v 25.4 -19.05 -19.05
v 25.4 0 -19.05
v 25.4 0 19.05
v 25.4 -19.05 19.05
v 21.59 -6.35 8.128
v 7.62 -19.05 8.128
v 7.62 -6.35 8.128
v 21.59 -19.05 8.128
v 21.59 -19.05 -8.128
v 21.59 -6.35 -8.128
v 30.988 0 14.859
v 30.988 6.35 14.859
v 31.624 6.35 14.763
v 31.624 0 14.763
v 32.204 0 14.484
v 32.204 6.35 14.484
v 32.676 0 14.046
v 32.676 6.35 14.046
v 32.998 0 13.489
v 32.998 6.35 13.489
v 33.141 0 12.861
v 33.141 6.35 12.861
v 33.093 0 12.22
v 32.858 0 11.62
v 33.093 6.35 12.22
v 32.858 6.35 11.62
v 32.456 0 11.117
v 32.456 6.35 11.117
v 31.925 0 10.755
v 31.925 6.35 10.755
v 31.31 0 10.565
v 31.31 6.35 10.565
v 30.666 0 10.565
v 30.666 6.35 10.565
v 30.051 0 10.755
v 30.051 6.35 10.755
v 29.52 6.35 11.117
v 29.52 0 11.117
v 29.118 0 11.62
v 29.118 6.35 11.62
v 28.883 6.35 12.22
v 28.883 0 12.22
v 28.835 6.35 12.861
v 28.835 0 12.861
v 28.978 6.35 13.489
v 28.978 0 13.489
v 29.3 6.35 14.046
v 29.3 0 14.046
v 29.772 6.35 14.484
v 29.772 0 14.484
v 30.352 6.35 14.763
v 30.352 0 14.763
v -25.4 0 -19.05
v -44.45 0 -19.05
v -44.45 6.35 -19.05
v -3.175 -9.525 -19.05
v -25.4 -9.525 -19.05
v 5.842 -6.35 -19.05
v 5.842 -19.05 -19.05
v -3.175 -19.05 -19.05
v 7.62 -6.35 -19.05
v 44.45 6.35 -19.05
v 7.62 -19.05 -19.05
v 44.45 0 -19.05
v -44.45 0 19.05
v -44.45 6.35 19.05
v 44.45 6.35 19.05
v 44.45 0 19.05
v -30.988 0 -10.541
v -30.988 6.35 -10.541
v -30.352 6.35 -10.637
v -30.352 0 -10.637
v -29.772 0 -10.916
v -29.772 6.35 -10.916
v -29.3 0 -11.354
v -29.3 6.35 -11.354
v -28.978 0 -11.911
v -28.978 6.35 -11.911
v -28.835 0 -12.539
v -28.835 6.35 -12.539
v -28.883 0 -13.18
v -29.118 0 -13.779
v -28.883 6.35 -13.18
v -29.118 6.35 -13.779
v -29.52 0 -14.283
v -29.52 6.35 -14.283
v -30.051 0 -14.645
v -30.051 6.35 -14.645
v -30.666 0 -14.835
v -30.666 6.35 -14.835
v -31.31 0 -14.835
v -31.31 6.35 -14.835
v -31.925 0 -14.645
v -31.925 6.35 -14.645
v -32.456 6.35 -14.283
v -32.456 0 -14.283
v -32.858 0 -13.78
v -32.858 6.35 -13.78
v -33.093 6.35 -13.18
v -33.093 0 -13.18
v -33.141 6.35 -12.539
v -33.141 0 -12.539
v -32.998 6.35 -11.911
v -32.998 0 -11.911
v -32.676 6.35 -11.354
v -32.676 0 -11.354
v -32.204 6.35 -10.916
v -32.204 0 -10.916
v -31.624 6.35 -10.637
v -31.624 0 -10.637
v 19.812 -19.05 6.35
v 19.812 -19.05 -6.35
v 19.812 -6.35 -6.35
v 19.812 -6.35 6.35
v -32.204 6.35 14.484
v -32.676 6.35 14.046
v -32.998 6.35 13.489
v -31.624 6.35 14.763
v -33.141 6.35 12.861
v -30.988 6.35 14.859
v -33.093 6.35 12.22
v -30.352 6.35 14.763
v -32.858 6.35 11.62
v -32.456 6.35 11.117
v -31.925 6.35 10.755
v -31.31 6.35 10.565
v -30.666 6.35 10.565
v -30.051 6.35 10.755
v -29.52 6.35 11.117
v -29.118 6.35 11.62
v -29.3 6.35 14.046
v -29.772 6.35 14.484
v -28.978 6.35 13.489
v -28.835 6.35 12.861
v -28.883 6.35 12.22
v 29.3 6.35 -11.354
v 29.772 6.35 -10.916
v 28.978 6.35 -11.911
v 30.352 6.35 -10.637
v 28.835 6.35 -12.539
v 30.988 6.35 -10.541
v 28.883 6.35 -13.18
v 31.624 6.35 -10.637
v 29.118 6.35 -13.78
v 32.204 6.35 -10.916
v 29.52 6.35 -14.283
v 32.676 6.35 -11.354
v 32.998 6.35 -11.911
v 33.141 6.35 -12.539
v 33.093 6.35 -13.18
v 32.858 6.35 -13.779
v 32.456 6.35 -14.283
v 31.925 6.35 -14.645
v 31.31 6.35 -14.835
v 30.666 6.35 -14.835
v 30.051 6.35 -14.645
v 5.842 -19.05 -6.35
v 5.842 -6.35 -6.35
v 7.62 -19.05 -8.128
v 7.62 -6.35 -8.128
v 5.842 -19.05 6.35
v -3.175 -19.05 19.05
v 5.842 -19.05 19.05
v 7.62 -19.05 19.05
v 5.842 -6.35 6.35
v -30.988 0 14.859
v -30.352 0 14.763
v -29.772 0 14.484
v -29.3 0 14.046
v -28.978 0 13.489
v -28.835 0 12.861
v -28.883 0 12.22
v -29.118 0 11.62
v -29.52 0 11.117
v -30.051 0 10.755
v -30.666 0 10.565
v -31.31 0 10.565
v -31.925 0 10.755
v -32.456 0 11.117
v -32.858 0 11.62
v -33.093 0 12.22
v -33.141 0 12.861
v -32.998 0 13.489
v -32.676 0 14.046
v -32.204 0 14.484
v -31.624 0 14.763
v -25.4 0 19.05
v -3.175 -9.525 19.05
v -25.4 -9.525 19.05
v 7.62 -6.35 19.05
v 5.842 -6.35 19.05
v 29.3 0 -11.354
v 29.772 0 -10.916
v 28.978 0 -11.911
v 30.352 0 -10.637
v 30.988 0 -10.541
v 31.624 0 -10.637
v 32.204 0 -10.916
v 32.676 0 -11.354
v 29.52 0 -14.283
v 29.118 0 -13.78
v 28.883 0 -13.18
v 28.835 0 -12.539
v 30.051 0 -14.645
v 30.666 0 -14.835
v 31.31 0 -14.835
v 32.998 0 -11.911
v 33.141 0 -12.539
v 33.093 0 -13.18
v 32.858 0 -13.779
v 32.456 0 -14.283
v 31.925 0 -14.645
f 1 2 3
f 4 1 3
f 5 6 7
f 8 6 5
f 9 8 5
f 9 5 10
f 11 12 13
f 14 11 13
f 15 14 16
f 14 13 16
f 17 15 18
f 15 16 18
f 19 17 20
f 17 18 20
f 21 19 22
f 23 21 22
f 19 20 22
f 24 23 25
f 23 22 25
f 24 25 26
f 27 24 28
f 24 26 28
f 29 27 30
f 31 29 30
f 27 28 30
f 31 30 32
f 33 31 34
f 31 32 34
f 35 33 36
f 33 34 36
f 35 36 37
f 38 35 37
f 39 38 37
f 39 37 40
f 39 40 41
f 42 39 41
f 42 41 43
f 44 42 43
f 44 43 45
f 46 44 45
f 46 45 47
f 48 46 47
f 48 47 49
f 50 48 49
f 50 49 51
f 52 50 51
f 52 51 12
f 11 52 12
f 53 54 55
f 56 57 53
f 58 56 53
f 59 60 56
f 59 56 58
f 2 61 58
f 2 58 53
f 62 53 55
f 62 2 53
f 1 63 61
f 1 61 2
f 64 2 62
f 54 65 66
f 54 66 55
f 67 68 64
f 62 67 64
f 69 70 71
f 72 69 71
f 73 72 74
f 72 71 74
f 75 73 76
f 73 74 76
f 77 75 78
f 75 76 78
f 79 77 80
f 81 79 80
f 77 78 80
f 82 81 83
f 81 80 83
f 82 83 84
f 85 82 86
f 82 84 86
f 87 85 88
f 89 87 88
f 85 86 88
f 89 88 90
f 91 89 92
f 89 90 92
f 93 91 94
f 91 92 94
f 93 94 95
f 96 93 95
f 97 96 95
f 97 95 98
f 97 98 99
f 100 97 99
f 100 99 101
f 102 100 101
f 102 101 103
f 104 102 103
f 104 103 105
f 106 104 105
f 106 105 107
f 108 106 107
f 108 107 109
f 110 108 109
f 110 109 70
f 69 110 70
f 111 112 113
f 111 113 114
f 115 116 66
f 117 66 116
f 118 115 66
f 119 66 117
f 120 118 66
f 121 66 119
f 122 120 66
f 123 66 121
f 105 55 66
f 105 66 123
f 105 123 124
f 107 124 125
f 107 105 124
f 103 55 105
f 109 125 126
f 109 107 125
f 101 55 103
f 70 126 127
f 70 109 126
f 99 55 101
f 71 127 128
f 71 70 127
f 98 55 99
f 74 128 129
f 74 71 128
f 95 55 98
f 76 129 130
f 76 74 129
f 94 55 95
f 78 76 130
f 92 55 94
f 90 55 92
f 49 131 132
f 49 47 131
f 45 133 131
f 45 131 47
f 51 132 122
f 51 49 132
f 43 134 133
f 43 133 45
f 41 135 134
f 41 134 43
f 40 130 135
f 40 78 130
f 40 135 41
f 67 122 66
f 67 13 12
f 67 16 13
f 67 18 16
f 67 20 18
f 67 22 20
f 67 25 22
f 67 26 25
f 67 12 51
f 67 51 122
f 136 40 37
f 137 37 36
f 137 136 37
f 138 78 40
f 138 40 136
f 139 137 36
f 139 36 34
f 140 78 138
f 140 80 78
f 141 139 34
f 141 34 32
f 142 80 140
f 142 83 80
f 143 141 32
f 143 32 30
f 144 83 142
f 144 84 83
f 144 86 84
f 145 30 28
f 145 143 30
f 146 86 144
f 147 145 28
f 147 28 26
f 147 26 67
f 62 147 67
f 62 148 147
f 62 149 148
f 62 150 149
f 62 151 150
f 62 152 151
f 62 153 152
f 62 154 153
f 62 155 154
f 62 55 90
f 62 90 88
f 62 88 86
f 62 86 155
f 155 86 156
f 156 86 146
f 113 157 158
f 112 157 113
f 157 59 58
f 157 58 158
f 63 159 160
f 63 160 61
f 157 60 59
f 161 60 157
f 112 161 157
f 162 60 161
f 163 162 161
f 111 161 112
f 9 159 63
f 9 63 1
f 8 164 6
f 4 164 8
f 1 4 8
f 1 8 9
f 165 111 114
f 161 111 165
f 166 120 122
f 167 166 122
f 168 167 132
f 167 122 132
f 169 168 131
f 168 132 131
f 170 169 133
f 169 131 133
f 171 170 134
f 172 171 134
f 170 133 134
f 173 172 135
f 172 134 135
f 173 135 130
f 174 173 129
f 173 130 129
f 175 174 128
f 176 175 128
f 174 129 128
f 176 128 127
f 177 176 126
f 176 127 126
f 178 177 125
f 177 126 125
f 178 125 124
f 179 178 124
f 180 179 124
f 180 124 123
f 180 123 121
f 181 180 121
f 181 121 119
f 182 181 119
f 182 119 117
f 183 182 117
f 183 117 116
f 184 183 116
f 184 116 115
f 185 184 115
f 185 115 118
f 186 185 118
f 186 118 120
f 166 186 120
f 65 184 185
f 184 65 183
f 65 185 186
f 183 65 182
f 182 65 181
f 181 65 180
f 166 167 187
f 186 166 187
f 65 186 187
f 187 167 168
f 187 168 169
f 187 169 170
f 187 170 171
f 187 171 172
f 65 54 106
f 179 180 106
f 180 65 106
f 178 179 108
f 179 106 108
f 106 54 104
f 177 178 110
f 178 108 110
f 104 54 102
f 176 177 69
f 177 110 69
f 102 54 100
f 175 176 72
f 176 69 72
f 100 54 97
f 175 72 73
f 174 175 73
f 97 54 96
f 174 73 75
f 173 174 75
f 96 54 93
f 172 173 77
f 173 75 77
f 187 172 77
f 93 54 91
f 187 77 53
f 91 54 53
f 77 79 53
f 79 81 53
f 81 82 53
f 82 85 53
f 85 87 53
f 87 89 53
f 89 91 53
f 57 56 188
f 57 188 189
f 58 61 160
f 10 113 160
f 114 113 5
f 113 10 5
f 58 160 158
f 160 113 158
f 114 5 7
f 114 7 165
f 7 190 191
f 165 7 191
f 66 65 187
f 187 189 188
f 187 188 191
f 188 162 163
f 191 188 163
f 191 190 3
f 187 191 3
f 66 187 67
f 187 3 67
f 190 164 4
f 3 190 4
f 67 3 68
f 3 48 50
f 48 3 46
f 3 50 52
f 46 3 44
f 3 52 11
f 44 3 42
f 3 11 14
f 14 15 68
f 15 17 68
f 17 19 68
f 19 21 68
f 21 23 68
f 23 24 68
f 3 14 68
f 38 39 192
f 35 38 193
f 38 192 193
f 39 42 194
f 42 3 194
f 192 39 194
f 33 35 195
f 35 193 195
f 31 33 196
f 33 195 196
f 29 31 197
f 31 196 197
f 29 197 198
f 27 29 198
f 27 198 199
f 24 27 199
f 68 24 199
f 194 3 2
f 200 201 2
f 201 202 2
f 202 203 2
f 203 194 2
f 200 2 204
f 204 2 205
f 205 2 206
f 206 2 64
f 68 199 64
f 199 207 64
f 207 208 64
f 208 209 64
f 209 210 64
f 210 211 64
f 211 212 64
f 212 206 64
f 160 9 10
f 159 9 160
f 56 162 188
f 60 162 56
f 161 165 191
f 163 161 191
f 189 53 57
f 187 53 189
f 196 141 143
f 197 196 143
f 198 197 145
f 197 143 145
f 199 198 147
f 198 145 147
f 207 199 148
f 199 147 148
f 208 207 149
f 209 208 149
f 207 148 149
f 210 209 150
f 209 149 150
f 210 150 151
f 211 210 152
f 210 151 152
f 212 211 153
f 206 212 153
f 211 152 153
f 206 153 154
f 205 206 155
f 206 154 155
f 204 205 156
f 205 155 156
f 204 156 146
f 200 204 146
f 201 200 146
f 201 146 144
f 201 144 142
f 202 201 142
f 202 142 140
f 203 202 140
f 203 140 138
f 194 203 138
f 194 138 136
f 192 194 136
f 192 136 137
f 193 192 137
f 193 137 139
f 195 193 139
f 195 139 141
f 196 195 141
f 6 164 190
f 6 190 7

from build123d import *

# Parameters (mm, degrees)
SKETCH1_W           = 88.9
SKETCH1_H           = 38.1
BOSS_EXTRUDE1_DEPTH = 6.35
CUT_EXTRUDE1_REACH  = 50.775
SKETCH2_R           = 2.159
SKETCH3_W           = 50.8
SKETCH3_H           = 38.1
BOSS_EXTRUDE2_DEPTH = 19.05
SKETCH4_W           = 22.225
SKETCH4_H           = 38.1
CUT_EXTRUDE2_DEPTH  = 9.525
CUT_EXTRUDE3_DEPTH  = 12.7


with BuildPart() as part:
    # Sketch1 → Boss-Extrude1 (new body)
    with BuildSketch(Plane(origin=(0, 0, 0), x_dir=(1, 0, 0), z_dir=(0, 1, 0))):
        Rectangle(SKETCH1_W, SKETCH1_H)
    extrude(amount=BOSS_EXTRUDE1_DEPTH)

    # Sketch2 → Cut-Extrude1 (cut, up to next)
    with BuildSketch(Plane(origin=(0, 6.35, 0), x_dir=(1, 0, 0), z_dir=(0, 1, 0)), mode=Mode.PRIVATE) as cut_extrude1_sk1:
        with Locations(Location((-30.988, 12.7, 0), (0, 0, 270))):
            Circle(SKETCH2_R)
    cut_extrude1_tool1 = extrude(cut_extrude1_sk1.sketch, amount=-CUT_EXTRUDE1_REACH, mode=Mode.PRIVATE) & part.part
    # Sketch2 → Cut-Extrude1 (cut, up to next)
    with BuildSketch(Plane(origin=(0, 6.35, 0), x_dir=(1, 0, 0), z_dir=(0, 1, 0)), mode=Mode.PRIVATE) as cut_extrude1_sk2:
        with Locations(Location((30.988, 12.7, 0), (0, 0, 270))):
            Circle(SKETCH2_R)
    cut_extrude1_tool2 = extrude(cut_extrude1_sk2.sketch, amount=-CUT_EXTRUDE1_REACH, mode=Mode.PRIVATE) & part.part
    # Sketch2 → Cut-Extrude1 (cut, up to next)
    with BuildSketch(Plane(origin=(0, 6.35, 0), x_dir=(1, 0, 0), z_dir=(0, 1, 0)), mode=Mode.PRIVATE) as cut_extrude1_sk3:
        with Locations(Location((30.988, -12.7, 0), (0, 0, 270))):
            Circle(SKETCH2_R)
    cut_extrude1_tool3 = extrude(cut_extrude1_sk3.sketch, amount=-CUT_EXTRUDE1_REACH, mode=Mode.PRIVATE) & part.part
    # Sketch2 → Cut-Extrude1 (cut, up to next)
    with BuildSketch(Plane(origin=(0, 6.35, 0), x_dir=(1, 0, 0), z_dir=(0, 1, 0)), mode=Mode.PRIVATE) as cut_extrude1_sk4:
        with Locations(Location((-30.988, -12.7, 0), (0, 0, 270))):
            Circle(SKETCH2_R)
    cut_extrude1_tool4 = extrude(cut_extrude1_sk4.sketch, amount=-CUT_EXTRUDE1_REACH, mode=Mode.PRIVATE) & part.part
    add(cut_extrude1_tool1.solids().sort_by_distance((-30.988, 6.35, -12.7))[0], mode=Mode.SUBTRACT)
    add(cut_extrude1_tool2.solids().sort_by_distance((30.988, 6.35, -12.7))[0], mode=Mode.SUBTRACT)
    add(cut_extrude1_tool3.solids().sort_by_distance((30.988, 6.35, 12.7))[0], mode=Mode.SUBTRACT)
    add(cut_extrude1_tool4.solids().sort_by_distance((-30.988, 6.35, 12.7))[0], mode=Mode.SUBTRACT)

    # Sketch3 → Boss-Extrude2 (add)
    with BuildSketch(Plane.XZ):
        Rectangle(SKETCH3_W, SKETCH3_H)
    extrude(amount=BOSS_EXTRUDE2_DEPTH)

    # Sketch4 → Cut-Extrude2 (cut)
    with BuildSketch(Plane(origin=(0, -19.05, 0), x_dir=(-1, 0, 0), z_dir=(0, -1, 0))):
        with Locations((14.2875, 0)):
            Rectangle(SKETCH4_W, SKETCH4_H)
    extrude(amount=-CUT_EXTRUDE2_DEPTH, mode=Mode.SUBTRACT)

    # Sketch5 → Cut-Extrude3 (cut)
    with BuildSketch(Plane.XZ.offset(19.05)):
        Polygon((5.842, -19.05), (5.842, -6.35), (19.812, -6.35), (19.812, 6.35), (5.842, 6.35), (5.842, 19.05), (7.62, 19.05), (7.62, 8.128), (21.59, 8.128), (21.59, -8.128), (7.62, -8.128), (7.62, -19.05), align=None)
    extrude(amount=-CUT_EXTRUDE3_DEPTH, mode=Mode.SUBTRACT)


solid = part.part
